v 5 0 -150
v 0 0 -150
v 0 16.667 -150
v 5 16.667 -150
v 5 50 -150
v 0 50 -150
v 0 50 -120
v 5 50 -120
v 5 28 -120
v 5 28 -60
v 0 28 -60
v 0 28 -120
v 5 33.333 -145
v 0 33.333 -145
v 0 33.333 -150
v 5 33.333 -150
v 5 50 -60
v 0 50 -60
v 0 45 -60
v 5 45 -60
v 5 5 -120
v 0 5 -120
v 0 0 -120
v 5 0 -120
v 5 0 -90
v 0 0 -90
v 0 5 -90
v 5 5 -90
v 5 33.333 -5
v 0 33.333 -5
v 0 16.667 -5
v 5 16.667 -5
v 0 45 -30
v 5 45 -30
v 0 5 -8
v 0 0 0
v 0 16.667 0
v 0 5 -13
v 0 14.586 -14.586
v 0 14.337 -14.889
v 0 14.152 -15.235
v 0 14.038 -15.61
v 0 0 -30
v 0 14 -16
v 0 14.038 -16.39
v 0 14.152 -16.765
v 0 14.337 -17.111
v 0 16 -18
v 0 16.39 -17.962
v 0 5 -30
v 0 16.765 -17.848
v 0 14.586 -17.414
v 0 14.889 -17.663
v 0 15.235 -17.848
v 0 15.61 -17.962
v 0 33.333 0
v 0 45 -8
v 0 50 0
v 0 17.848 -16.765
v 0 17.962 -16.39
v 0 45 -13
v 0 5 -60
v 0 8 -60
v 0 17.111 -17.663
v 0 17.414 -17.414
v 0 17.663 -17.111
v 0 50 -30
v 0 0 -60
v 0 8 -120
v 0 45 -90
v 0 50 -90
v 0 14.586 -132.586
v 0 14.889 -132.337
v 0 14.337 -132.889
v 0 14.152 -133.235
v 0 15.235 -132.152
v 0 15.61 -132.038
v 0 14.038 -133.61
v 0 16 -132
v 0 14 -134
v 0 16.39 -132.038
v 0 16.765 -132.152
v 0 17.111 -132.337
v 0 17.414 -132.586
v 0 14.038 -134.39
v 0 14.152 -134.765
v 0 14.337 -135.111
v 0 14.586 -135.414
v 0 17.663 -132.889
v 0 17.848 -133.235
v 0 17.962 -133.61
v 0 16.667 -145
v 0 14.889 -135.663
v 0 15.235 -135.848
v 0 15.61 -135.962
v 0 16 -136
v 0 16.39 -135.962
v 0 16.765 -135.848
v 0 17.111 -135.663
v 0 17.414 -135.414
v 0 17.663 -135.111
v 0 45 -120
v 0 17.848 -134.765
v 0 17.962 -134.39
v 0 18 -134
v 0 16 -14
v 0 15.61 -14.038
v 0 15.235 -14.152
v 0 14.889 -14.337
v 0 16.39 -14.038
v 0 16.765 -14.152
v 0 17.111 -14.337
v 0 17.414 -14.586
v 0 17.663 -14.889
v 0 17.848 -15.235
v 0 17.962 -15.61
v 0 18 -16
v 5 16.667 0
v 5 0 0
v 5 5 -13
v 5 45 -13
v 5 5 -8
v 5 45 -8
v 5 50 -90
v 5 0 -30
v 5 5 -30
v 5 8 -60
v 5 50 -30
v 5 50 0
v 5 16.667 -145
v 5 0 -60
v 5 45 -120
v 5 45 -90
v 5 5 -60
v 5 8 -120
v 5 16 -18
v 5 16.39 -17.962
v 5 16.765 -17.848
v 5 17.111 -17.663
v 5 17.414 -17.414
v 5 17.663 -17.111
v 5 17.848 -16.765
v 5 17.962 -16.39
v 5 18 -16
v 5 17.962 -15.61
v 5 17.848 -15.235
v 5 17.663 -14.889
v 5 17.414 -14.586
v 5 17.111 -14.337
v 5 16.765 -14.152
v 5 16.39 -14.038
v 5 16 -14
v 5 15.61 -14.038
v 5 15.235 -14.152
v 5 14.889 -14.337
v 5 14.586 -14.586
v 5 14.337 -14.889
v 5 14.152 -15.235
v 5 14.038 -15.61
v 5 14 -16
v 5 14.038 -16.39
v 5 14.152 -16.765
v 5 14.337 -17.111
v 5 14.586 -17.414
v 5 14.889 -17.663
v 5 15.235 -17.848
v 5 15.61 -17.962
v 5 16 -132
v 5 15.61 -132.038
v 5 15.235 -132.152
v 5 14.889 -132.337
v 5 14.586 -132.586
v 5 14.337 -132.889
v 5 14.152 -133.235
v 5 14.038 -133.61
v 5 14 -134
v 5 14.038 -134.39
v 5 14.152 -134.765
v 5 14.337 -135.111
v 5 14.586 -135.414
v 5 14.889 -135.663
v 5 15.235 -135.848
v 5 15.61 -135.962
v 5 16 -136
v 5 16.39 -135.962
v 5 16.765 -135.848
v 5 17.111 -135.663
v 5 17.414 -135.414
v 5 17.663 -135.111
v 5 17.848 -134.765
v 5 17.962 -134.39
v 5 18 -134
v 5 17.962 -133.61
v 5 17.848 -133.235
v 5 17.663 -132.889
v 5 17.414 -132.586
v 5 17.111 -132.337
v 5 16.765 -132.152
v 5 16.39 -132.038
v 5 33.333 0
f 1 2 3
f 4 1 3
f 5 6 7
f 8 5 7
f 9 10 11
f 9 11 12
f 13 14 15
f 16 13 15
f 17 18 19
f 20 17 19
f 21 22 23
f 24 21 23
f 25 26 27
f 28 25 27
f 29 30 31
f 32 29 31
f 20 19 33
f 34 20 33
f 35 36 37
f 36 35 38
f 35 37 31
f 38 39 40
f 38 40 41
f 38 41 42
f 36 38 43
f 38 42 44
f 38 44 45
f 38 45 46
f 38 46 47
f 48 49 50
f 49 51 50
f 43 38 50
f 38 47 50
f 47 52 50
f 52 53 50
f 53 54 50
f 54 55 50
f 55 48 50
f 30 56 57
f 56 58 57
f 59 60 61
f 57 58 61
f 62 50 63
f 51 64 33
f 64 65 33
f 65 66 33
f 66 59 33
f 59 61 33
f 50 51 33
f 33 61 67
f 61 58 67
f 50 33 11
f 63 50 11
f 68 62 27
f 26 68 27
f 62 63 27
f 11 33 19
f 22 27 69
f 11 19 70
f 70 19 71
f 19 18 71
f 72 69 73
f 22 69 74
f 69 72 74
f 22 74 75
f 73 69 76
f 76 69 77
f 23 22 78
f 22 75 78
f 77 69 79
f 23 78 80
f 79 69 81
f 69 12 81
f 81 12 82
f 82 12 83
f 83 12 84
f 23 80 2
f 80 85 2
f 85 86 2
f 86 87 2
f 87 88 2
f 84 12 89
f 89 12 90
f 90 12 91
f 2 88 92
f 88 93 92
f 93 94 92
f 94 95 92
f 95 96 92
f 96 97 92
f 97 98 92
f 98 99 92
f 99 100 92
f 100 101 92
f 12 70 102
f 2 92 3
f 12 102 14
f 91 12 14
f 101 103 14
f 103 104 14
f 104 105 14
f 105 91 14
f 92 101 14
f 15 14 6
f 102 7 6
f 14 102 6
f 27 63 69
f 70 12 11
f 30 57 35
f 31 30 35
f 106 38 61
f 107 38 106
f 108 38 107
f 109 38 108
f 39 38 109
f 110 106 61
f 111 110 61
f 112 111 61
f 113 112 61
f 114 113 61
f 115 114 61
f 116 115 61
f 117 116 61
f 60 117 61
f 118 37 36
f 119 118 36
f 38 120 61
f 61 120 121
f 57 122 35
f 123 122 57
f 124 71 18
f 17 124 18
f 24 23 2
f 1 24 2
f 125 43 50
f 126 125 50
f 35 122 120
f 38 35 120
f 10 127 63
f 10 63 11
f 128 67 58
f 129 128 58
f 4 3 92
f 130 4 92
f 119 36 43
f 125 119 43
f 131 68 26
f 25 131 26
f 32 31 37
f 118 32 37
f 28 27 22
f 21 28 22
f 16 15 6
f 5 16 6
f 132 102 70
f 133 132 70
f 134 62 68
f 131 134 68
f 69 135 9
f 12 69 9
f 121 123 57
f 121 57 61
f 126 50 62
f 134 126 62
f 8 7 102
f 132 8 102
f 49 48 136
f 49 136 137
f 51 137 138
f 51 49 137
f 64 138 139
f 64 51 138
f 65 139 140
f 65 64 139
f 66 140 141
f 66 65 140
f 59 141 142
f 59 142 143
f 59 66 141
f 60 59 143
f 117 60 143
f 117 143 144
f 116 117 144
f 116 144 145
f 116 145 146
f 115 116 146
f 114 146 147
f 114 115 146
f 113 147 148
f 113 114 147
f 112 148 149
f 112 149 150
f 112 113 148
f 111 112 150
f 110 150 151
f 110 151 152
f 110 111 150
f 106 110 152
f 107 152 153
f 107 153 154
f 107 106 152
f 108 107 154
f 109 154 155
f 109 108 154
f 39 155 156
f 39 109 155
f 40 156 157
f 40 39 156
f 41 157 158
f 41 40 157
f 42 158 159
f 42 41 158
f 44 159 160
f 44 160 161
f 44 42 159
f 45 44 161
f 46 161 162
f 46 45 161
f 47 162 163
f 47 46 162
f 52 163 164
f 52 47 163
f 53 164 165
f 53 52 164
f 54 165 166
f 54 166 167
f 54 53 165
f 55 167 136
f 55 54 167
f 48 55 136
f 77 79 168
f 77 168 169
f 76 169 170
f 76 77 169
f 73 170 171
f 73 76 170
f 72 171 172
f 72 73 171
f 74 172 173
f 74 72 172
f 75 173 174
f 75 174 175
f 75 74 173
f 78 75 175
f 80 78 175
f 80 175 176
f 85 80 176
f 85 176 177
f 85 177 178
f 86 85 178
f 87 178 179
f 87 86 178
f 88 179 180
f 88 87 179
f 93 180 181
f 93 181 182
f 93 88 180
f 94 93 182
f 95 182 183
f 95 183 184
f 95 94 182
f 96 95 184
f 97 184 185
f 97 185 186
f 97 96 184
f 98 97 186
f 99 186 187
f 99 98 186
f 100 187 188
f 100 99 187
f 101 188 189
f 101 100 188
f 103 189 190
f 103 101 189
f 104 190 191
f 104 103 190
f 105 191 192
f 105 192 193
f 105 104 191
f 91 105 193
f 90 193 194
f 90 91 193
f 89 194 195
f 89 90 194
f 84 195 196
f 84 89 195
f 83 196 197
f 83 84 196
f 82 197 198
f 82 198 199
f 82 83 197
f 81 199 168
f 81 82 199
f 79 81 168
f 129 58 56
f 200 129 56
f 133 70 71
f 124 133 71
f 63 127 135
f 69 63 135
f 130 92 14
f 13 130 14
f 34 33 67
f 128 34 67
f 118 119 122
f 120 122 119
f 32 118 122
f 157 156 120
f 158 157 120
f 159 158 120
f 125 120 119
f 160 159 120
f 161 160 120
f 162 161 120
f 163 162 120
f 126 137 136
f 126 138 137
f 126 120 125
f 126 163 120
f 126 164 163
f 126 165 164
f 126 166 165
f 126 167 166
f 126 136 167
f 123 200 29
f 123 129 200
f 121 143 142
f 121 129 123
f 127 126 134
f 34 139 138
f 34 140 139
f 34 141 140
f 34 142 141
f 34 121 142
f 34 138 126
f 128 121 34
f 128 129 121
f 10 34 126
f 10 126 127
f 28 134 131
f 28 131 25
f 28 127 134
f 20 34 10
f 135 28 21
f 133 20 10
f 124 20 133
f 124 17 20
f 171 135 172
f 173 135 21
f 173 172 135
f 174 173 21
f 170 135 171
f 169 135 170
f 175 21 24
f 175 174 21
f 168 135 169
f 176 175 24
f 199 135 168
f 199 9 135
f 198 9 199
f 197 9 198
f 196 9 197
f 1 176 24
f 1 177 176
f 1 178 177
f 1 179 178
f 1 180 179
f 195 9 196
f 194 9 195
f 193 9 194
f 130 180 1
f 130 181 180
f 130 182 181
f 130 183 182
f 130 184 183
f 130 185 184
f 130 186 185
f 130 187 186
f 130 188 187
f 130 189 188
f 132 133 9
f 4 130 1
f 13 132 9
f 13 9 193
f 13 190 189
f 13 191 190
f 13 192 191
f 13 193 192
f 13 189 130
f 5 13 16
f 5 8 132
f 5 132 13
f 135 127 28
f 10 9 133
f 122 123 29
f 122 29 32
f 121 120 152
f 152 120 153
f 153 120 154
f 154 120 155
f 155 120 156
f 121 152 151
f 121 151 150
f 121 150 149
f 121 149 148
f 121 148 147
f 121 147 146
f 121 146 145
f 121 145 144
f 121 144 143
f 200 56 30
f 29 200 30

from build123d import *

# Parameters (mm, degrees)
CROQUIS1_R              = 2
SALIENTE_EXTRUIR1_DEPTH = 5
CROQUIS2_W              = 60
CROQUIS2_H              = 20
CORTAR_EXTRUIR1_DEPTH   = 10
CROQUIS3_W              = 5
CROQUIS3_H              = 40
CORTAR_EXTRUIR2_DEPTH   = 10


with BuildPart() as part:
    # Croquis1 → Saliente-Extruir1 (new body)
    with BuildSketch(Plane(origin=(0, 0, 0), x_dir=(0, 0, -1), z_dir=(1, 0, 0))):
        Polygon((0, 33.333333333), (5, 33.333333333), (5, 16.666666667), (0, 16.666666667), (0, 0), (30, 0), (30, 5), (60, 5), (60, 0), (90, 0), (90, 5), (120, 5), (120, 0), (150, 0), (150, 16.666666667), (145, 16.666666667), (145, 33.333333333), (150, 33.333333333), (150, 50), (120, 50), (120, 45), (90, 45), (90, 50), (60, 50), (60, 45), (30, 45), (30, 50), (0, 50), align=None)
        with Locations((16, 16)):
            Circle(CROQUIS1_R, mode=Mode.SUBTRACT)
        with Locations(Location((134, 16, 0), (0, 0, 180))):
            Circle(CROQUIS1_R, mode=Mode.SUBTRACT)
    extrude(amount=SALIENTE_EXTRUIR1_DEPTH)

    # Croquis2 → Cortar-Extruir1 (cut)
    with BuildSketch(Plane(origin=(5, 0, 0), x_dir=(0, 0, -1), z_dir=(1, 0, 0))):
        with Locations((90, 18)):
            Rectangle(CROQUIS2_W, CROQUIS2_H)
    extrude(amount=-CORTAR_EXTRUIR1_DEPTH, mode=Mode.SUBTRACT)

    # Croquis3 → Cortar-Extruir2 (cut)
    with BuildSketch(Plane(origin=(5, 0, 0), x_dir=(0, 0, -1), z_dir=(1, 0, 0))):
        with Locations((10.5, 25)):
            Rectangle(CROQUIS3_W, CROQUIS3_H)
    extrude(amount=-CORTAR_EXTRUIR2_DEPTH, mode=Mode.SUBTRACT)


solid = part.part
